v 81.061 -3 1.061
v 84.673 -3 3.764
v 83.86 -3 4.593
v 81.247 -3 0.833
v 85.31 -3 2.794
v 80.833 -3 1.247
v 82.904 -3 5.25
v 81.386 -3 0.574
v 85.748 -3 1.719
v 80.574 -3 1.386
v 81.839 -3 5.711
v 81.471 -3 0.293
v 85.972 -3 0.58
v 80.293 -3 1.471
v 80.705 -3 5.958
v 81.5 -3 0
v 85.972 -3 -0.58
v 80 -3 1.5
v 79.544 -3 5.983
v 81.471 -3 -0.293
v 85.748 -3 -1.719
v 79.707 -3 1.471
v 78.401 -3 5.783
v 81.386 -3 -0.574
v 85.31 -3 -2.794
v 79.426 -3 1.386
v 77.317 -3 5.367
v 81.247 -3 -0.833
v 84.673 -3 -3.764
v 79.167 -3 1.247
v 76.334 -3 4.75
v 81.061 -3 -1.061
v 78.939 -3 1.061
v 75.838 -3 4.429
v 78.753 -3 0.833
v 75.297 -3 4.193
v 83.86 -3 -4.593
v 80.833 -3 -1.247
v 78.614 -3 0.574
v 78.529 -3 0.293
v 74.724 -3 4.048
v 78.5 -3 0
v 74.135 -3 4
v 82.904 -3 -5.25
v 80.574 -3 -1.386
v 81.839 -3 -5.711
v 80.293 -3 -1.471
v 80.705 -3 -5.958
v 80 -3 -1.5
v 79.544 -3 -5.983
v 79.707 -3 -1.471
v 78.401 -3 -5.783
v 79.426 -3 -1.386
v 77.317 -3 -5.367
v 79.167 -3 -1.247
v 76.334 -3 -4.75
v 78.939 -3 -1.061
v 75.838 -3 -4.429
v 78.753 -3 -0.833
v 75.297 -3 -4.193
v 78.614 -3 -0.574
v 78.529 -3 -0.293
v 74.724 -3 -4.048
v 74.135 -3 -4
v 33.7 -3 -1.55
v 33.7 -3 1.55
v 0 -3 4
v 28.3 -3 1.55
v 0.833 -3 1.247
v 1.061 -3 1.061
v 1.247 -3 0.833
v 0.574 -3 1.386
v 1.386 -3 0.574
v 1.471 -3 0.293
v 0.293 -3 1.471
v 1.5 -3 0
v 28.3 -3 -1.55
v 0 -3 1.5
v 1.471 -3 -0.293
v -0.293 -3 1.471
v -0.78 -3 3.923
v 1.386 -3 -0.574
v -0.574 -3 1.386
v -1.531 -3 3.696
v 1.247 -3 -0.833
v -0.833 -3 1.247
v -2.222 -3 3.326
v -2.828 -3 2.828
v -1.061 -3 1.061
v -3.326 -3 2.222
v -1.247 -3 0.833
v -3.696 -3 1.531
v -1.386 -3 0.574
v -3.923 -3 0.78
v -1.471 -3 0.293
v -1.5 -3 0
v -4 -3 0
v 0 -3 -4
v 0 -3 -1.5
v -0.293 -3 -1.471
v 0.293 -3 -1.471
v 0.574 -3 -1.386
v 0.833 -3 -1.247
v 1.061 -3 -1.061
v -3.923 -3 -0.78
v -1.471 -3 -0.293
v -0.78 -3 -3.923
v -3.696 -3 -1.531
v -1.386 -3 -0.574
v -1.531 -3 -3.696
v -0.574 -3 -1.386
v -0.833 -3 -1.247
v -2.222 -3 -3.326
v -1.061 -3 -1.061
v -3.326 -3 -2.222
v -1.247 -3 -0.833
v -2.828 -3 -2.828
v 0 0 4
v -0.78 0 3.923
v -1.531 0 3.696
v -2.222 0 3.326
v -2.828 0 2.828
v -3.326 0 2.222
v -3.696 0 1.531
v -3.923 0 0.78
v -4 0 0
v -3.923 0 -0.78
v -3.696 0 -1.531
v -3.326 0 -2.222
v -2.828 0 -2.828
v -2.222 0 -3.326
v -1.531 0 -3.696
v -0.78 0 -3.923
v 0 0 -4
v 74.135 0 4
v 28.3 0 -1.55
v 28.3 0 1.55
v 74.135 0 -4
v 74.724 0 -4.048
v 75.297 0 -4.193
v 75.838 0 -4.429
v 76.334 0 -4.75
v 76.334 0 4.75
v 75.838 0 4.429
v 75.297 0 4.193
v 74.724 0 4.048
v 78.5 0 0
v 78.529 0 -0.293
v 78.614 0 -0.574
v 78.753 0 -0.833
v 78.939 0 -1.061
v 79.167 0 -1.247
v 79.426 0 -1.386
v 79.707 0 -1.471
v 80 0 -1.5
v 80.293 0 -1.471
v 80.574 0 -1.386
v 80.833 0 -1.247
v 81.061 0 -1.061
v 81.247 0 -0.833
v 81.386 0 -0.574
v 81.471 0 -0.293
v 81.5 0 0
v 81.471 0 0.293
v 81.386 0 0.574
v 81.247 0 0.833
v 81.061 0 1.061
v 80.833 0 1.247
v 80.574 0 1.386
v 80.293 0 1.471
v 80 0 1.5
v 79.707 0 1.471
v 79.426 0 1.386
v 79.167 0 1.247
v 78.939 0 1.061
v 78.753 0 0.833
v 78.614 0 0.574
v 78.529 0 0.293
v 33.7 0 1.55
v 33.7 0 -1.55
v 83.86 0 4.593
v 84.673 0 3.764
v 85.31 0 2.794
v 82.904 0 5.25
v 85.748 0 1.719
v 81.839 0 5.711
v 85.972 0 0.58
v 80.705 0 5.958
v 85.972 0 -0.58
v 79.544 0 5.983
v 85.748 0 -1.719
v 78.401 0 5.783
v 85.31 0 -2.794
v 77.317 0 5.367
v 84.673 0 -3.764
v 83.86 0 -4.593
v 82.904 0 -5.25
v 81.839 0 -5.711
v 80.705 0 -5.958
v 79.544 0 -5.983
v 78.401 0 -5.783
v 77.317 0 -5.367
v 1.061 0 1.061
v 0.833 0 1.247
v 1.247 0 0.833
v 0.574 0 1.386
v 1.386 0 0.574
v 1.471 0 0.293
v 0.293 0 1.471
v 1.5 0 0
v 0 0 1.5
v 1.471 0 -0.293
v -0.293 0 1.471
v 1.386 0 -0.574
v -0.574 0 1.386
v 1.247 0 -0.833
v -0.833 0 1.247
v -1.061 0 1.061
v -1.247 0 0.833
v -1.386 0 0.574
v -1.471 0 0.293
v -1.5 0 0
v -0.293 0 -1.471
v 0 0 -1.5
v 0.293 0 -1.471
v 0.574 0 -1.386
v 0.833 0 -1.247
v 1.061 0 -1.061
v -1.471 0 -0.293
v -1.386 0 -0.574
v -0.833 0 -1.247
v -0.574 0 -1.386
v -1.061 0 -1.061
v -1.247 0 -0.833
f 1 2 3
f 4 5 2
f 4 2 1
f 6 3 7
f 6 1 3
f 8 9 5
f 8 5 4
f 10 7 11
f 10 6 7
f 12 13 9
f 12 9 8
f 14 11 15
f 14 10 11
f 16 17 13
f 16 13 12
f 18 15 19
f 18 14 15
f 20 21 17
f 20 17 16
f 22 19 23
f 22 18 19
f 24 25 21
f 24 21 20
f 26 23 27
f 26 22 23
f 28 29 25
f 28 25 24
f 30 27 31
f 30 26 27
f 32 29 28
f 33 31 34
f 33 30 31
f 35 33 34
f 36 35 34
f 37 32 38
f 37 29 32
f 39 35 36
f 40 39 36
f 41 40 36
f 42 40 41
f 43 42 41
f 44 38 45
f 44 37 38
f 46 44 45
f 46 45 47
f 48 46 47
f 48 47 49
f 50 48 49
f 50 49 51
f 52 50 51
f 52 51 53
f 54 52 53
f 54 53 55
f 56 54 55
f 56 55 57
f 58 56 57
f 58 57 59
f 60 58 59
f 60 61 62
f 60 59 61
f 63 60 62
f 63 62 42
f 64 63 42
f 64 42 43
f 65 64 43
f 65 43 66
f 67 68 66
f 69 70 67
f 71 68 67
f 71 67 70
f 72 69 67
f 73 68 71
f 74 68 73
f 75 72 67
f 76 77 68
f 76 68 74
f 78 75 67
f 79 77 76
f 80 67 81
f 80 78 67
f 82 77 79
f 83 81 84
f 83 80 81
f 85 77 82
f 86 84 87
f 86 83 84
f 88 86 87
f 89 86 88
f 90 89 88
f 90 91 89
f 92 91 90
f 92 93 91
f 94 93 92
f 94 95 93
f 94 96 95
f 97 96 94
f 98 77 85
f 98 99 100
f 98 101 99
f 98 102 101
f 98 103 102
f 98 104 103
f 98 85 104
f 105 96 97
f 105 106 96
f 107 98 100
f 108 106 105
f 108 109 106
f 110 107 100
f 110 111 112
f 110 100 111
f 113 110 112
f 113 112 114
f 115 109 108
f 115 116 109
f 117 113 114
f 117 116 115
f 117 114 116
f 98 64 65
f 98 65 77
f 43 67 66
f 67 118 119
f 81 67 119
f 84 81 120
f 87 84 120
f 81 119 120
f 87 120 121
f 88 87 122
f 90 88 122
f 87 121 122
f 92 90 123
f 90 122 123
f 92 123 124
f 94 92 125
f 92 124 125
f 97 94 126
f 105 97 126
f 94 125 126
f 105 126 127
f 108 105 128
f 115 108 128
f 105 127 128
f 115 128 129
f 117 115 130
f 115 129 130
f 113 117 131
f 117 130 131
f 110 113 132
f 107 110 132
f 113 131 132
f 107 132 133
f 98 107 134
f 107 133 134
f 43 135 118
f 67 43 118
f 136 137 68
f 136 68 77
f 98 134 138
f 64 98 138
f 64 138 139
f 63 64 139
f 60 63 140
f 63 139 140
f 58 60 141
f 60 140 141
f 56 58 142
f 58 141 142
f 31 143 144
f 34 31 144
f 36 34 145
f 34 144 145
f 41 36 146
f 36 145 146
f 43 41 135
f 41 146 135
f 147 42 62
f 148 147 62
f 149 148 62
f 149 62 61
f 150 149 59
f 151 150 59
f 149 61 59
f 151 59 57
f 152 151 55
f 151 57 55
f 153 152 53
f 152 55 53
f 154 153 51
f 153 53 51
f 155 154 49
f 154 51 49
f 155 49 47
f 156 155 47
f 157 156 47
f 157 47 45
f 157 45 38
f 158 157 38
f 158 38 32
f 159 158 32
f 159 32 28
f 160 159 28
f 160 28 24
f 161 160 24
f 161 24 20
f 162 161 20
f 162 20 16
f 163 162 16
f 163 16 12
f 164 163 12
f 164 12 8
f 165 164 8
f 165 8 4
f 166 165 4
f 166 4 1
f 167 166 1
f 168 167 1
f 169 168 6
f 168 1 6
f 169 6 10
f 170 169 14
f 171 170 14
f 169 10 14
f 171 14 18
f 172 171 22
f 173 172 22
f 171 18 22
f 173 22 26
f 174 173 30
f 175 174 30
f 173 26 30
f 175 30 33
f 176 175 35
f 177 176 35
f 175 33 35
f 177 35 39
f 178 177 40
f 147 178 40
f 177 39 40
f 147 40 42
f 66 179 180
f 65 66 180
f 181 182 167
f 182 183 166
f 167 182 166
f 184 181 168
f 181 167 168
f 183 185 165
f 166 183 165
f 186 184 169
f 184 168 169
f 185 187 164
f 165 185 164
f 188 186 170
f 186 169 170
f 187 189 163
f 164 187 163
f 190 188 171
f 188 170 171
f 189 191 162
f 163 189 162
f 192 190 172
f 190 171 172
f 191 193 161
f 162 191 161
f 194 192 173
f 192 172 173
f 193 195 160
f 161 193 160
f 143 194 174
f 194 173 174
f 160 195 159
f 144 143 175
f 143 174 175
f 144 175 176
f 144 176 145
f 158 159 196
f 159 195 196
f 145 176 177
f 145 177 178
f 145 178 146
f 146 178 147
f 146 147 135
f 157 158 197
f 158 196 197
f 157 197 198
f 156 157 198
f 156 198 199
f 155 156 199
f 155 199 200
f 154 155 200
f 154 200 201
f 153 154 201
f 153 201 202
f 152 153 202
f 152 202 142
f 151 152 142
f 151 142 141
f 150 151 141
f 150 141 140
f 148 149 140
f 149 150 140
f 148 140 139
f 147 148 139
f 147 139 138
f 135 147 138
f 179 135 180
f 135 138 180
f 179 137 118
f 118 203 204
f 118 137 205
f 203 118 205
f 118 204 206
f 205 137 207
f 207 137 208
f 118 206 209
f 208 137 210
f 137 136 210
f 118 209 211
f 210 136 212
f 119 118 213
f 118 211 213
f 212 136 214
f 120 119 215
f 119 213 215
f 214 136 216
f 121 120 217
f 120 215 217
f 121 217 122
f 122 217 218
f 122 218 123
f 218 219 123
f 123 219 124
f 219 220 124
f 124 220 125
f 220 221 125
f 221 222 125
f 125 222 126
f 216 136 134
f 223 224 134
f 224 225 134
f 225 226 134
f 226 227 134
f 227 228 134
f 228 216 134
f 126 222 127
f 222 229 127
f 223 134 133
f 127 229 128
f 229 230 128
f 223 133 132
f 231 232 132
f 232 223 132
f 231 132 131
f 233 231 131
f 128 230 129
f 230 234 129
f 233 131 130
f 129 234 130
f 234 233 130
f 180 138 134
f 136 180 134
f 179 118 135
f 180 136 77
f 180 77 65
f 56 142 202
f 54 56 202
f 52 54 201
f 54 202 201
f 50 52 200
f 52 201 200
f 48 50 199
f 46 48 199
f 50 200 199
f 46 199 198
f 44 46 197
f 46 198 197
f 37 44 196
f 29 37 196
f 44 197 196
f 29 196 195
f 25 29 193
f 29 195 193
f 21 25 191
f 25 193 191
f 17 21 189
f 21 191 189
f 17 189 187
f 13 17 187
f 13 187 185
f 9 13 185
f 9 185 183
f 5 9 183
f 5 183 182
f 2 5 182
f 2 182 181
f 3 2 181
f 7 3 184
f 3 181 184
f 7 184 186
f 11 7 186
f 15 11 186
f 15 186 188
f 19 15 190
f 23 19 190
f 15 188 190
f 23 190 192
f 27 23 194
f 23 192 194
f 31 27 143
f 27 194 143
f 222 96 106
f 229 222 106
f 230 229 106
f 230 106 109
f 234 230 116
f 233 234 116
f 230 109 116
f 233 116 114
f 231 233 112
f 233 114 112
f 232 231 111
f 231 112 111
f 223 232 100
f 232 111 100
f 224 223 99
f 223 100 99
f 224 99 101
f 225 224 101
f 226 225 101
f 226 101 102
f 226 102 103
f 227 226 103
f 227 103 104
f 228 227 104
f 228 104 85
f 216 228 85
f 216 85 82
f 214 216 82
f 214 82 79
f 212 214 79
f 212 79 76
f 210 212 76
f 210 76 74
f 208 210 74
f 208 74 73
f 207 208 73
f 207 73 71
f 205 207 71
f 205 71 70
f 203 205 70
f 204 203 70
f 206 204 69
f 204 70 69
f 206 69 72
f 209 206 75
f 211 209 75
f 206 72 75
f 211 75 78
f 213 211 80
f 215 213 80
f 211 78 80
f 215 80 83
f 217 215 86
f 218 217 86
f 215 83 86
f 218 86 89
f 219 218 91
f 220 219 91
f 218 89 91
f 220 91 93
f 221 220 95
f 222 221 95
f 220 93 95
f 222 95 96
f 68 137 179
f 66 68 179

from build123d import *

# Parameters (mm, degrees)
RESSALTO_EXTRUS_O1_DEPTH   = 3
ESBO_O2_W                  = 5.4
ESBO_O2_H                  = 3.1
CORTE_EXTRUS_O1_DEPTH      = 87.261231153
FURO_DE_DI_METRO_3_0_3_1_D = 3


with BuildPart() as part:
    # Esboço1 → Ressalto-extrusão1 (new body)
    with BuildSketch(Plane(origin=(0, 0, 0), x_dir=(1, 0, 0), z_dir=(0, 1, 0))):
        with BuildLine():
            Line((0, 4), (74.134848681, 4))
            ThreePointArc((74.134848681, 4), (75.296743684, 4.192654993), (76.334280425, 4.75))
            ThreePointArc((76.334280425, 4.75), (86, 0), (76.334280425, -4.75))
            ThreePointArc((76.334280425, -4.75), (75.296743684, -4.192654993), (74.134848681, -4))
            Line((74.134848681, -4), (0, -4))
            ThreePointArc((0, -4), (-4, 0), (0, 4))
        make_face()
    extrude(amount=-RESSALTO_EXTRUS_O1_DEPTH)

    # Esboço2 → Corte-extrusão1 (cut, through all)
    with BuildSketch(Plane(origin=(0, 0, 0), x_dir=(1, 0, 0), z_dir=(0, 1, 0))):
        with Locations((31, 0)):
            Rectangle(ESBO_O2_W, ESBO_O2_H)
    extrude(amount=-CORTE_EXTRUS_O1_DEPTH, mode=Mode.SUBTRACT)

    # Furo de diâmetro Ø3.0 (3)1 (through all)
    with Locations(Plane(origin=(0, 0, 0), x_dir=(1, 0, 0), z_dir=(0, 1, 0))):
        with Locations((0, 0), (80, 0)):
            Hole(FURO_DE_DI_METRO_3_0_3_1_D / 2)


solid = part.part
